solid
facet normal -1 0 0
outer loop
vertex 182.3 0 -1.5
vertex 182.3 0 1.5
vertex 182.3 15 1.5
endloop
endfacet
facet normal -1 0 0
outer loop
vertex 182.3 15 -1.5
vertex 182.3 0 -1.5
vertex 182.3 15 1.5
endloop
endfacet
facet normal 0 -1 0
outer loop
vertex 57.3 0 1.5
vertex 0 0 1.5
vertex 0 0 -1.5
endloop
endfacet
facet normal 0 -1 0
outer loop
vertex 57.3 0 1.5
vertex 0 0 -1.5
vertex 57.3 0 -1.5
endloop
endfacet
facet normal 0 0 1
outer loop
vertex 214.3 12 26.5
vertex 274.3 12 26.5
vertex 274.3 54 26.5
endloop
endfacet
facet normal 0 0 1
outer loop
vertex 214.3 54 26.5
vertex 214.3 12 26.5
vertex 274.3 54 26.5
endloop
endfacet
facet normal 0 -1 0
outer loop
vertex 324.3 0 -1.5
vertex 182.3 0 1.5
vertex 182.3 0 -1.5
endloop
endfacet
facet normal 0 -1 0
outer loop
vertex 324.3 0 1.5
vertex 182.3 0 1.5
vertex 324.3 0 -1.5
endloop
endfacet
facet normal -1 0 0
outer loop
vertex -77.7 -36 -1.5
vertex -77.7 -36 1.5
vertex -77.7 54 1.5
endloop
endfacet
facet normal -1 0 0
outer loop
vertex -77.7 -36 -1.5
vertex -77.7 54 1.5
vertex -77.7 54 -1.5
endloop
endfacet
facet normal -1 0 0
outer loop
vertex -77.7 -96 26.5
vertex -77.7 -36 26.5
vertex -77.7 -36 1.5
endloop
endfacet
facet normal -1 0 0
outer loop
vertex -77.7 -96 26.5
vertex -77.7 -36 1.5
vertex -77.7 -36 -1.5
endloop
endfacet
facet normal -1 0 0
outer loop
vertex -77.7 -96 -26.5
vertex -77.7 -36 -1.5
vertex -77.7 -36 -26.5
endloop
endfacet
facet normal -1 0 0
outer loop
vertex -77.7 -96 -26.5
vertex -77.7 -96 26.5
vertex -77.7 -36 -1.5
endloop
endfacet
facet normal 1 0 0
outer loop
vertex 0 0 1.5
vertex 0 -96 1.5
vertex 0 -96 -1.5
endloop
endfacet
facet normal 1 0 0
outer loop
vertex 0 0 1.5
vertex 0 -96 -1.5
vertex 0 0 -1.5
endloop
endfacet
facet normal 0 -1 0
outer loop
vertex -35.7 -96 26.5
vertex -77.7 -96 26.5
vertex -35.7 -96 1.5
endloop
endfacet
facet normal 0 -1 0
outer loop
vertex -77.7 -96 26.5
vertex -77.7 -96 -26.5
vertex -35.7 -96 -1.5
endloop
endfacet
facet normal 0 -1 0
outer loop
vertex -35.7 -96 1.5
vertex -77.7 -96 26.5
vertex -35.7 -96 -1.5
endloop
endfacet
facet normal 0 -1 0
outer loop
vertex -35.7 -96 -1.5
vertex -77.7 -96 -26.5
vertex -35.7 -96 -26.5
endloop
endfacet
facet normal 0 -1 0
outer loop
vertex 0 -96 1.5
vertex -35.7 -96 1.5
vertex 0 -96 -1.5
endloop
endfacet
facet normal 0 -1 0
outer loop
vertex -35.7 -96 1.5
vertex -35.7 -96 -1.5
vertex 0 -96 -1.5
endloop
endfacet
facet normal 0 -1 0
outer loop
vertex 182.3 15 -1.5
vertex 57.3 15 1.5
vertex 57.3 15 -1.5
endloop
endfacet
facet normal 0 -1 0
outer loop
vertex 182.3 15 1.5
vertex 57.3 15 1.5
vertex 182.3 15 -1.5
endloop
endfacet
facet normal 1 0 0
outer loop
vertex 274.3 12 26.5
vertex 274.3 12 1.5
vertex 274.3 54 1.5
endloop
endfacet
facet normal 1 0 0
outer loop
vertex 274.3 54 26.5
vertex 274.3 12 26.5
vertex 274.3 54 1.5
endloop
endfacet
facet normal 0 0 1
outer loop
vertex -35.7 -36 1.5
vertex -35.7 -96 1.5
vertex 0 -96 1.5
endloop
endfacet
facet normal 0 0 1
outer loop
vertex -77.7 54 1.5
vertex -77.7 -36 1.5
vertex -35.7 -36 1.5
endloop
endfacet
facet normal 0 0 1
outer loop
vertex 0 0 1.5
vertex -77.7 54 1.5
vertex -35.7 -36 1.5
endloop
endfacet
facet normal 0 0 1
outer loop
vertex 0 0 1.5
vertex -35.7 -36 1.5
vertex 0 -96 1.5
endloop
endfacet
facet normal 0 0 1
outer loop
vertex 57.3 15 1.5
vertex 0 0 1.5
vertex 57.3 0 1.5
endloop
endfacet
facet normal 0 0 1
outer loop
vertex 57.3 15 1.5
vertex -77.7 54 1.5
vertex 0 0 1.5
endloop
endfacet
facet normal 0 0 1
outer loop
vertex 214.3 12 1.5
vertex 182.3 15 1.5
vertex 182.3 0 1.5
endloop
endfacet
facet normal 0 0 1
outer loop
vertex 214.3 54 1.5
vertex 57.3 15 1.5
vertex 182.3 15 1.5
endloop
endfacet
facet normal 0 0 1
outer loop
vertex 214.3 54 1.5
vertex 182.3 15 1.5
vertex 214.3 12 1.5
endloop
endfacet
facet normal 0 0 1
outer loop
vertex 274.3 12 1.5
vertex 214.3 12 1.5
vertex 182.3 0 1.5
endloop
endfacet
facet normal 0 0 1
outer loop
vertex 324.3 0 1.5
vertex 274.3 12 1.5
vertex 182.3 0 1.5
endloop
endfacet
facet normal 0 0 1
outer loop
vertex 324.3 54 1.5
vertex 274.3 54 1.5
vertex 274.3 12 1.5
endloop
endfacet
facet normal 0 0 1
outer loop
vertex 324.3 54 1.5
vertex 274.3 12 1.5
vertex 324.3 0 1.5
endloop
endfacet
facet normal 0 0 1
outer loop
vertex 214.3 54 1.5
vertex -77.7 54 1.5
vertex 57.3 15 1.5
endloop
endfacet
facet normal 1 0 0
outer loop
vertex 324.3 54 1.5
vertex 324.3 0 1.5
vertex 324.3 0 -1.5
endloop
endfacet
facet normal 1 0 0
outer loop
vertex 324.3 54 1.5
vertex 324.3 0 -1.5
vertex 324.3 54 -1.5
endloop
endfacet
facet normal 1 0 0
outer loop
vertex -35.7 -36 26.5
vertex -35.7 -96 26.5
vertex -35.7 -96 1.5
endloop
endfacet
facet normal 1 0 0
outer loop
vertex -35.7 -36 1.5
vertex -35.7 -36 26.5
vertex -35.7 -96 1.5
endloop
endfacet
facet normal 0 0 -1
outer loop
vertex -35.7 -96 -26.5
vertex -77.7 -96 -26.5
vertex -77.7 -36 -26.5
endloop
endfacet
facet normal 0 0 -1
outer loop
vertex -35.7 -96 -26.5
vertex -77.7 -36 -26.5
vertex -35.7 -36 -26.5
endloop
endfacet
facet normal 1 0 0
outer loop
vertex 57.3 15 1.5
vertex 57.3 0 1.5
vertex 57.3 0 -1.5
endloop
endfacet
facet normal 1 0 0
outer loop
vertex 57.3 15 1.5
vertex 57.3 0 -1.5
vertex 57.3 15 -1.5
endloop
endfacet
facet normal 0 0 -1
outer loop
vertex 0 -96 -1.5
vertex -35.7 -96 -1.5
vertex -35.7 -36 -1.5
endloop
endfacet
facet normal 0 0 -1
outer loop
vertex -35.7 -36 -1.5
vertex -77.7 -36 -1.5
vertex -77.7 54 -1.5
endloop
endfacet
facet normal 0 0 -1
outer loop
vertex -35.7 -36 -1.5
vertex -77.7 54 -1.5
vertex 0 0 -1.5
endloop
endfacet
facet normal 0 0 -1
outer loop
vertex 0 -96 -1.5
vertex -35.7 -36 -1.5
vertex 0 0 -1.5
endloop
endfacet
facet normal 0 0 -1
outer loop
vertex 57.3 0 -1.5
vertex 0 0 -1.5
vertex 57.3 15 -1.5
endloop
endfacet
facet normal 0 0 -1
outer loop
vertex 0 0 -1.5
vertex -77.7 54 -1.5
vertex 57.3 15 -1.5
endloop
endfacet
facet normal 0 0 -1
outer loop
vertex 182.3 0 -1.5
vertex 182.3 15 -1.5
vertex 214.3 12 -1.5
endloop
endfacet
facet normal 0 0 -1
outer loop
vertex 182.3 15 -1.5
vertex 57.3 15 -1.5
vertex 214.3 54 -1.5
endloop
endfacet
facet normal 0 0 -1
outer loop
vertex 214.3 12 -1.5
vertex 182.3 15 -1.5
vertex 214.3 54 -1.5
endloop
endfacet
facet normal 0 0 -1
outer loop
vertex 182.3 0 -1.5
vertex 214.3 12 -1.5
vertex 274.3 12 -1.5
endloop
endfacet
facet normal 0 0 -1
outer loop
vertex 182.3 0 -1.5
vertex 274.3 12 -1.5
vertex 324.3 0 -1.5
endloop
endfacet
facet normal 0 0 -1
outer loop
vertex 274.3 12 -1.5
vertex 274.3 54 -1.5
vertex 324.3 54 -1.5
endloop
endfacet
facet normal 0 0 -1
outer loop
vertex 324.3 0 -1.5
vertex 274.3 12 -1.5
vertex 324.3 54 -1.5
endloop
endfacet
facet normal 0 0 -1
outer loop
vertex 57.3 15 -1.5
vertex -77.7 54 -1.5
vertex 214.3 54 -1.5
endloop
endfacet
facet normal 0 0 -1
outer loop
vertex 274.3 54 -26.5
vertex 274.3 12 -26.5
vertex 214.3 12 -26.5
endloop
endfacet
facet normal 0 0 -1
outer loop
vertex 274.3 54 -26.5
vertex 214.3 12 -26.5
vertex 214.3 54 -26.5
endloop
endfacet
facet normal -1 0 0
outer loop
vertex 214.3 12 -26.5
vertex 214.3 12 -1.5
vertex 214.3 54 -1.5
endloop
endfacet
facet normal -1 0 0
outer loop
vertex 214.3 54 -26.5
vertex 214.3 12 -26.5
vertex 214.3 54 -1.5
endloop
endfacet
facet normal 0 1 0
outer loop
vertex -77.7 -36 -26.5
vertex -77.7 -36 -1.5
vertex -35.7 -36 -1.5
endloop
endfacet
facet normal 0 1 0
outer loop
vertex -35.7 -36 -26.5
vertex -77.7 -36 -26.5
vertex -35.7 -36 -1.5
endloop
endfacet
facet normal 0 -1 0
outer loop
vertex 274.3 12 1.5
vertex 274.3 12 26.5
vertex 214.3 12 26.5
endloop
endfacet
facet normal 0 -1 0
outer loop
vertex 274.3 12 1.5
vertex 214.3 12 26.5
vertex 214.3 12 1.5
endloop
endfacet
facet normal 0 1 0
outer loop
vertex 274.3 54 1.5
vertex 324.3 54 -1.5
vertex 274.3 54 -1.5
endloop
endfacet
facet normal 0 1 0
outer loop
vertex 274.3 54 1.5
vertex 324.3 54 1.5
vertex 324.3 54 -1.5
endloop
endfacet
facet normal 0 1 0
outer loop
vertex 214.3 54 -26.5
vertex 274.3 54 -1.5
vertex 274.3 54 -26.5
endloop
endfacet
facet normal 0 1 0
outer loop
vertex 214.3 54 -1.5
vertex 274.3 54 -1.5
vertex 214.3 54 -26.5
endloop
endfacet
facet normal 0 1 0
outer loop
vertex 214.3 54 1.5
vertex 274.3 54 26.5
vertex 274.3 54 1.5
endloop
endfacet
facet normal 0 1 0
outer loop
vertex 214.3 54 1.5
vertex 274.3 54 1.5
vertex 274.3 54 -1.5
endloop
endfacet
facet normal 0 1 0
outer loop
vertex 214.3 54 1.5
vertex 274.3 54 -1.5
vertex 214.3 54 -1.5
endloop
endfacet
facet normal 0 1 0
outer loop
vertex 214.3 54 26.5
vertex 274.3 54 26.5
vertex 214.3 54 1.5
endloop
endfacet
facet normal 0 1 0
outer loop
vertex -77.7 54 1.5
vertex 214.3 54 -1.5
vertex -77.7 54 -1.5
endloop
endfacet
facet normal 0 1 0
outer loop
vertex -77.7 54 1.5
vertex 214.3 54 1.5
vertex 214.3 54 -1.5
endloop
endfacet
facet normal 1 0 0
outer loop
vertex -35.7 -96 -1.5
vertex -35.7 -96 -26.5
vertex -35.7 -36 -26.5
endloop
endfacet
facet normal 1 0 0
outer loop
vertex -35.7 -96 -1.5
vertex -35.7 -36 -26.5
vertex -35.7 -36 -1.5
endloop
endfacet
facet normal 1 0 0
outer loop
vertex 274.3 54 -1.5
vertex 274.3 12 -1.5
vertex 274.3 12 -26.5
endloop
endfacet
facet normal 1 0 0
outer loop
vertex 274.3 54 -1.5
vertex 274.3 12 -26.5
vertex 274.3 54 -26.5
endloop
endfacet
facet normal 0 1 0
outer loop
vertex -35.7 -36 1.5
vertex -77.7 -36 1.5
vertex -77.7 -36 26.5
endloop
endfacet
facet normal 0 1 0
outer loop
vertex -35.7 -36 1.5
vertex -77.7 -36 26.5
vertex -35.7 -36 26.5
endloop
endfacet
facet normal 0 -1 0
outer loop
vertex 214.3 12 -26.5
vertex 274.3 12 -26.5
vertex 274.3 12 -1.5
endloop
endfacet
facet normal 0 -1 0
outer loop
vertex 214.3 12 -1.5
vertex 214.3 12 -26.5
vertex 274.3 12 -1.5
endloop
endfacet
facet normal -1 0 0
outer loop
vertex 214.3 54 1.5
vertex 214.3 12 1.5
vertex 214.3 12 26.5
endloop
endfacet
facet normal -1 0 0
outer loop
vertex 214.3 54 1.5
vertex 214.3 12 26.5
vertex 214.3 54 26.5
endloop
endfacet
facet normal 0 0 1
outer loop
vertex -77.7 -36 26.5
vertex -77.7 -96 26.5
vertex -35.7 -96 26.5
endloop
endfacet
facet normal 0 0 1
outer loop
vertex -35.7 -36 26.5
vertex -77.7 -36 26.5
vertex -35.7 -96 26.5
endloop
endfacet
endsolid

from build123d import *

# Parameters (mm, degrees)
F1_DEPTH = 1.5
F2_W     = 42
F2_H     = 25
F3_DEPTH = 60
F5_W     = 42
F5_H     = 25
F6_DEPTH = 60
F7_W     = 125
F7_H     = 15
F8_DEPTH = 25


# Not quite as in the source:
# - a pattern or mirror of a feature is missing from the dataset's text; its kind, count and spacing are read off the source's solid


with BuildPart() as f1:
    # F0 (on Top) → F1 (new body, symmetric)
    with BuildSketch(Plane.XY):
        Polygon((-77.7, -96), (0, -96), (0, 0), (324.3, 0), (324.3, 54), (-77.7, 54), align=None)
    extrude(amount=F1_DEPTH, both=True)

    # F2 (on face) → F3 (join)
    with BuildSketch(Plane.XZ.offset(96)):
        with Locations((-56.7, -14)):
            Rectangle(F2_W, F2_H)
    f3 = extrude(amount=-F3_DEPTH)

    # F3_copies: F3 across plane
    add(f3.mirror(Plane.XY))

    # F5 (on offset) → F6 (join)
    with BuildSketch(Plane.YZ.offset(274.3)):
        with Locations((33, -14)):
            Rectangle(F5_W, F5_H)
    f6 = extrude(amount=-F6_DEPTH)

    # F6_copies: F6 across plane
    add(f6.mirror(Plane.XY))

    # F7 (on face) → F8 (cut)
    with BuildSketch(Plane.XY.offset(1.5)):
        with Locations((119.8, 7.5)):
            Rectangle(F7_W, F7_H)
    extrude(amount=-F8_DEPTH, mode=Mode.SUBTRACT)


solid = f1.part
